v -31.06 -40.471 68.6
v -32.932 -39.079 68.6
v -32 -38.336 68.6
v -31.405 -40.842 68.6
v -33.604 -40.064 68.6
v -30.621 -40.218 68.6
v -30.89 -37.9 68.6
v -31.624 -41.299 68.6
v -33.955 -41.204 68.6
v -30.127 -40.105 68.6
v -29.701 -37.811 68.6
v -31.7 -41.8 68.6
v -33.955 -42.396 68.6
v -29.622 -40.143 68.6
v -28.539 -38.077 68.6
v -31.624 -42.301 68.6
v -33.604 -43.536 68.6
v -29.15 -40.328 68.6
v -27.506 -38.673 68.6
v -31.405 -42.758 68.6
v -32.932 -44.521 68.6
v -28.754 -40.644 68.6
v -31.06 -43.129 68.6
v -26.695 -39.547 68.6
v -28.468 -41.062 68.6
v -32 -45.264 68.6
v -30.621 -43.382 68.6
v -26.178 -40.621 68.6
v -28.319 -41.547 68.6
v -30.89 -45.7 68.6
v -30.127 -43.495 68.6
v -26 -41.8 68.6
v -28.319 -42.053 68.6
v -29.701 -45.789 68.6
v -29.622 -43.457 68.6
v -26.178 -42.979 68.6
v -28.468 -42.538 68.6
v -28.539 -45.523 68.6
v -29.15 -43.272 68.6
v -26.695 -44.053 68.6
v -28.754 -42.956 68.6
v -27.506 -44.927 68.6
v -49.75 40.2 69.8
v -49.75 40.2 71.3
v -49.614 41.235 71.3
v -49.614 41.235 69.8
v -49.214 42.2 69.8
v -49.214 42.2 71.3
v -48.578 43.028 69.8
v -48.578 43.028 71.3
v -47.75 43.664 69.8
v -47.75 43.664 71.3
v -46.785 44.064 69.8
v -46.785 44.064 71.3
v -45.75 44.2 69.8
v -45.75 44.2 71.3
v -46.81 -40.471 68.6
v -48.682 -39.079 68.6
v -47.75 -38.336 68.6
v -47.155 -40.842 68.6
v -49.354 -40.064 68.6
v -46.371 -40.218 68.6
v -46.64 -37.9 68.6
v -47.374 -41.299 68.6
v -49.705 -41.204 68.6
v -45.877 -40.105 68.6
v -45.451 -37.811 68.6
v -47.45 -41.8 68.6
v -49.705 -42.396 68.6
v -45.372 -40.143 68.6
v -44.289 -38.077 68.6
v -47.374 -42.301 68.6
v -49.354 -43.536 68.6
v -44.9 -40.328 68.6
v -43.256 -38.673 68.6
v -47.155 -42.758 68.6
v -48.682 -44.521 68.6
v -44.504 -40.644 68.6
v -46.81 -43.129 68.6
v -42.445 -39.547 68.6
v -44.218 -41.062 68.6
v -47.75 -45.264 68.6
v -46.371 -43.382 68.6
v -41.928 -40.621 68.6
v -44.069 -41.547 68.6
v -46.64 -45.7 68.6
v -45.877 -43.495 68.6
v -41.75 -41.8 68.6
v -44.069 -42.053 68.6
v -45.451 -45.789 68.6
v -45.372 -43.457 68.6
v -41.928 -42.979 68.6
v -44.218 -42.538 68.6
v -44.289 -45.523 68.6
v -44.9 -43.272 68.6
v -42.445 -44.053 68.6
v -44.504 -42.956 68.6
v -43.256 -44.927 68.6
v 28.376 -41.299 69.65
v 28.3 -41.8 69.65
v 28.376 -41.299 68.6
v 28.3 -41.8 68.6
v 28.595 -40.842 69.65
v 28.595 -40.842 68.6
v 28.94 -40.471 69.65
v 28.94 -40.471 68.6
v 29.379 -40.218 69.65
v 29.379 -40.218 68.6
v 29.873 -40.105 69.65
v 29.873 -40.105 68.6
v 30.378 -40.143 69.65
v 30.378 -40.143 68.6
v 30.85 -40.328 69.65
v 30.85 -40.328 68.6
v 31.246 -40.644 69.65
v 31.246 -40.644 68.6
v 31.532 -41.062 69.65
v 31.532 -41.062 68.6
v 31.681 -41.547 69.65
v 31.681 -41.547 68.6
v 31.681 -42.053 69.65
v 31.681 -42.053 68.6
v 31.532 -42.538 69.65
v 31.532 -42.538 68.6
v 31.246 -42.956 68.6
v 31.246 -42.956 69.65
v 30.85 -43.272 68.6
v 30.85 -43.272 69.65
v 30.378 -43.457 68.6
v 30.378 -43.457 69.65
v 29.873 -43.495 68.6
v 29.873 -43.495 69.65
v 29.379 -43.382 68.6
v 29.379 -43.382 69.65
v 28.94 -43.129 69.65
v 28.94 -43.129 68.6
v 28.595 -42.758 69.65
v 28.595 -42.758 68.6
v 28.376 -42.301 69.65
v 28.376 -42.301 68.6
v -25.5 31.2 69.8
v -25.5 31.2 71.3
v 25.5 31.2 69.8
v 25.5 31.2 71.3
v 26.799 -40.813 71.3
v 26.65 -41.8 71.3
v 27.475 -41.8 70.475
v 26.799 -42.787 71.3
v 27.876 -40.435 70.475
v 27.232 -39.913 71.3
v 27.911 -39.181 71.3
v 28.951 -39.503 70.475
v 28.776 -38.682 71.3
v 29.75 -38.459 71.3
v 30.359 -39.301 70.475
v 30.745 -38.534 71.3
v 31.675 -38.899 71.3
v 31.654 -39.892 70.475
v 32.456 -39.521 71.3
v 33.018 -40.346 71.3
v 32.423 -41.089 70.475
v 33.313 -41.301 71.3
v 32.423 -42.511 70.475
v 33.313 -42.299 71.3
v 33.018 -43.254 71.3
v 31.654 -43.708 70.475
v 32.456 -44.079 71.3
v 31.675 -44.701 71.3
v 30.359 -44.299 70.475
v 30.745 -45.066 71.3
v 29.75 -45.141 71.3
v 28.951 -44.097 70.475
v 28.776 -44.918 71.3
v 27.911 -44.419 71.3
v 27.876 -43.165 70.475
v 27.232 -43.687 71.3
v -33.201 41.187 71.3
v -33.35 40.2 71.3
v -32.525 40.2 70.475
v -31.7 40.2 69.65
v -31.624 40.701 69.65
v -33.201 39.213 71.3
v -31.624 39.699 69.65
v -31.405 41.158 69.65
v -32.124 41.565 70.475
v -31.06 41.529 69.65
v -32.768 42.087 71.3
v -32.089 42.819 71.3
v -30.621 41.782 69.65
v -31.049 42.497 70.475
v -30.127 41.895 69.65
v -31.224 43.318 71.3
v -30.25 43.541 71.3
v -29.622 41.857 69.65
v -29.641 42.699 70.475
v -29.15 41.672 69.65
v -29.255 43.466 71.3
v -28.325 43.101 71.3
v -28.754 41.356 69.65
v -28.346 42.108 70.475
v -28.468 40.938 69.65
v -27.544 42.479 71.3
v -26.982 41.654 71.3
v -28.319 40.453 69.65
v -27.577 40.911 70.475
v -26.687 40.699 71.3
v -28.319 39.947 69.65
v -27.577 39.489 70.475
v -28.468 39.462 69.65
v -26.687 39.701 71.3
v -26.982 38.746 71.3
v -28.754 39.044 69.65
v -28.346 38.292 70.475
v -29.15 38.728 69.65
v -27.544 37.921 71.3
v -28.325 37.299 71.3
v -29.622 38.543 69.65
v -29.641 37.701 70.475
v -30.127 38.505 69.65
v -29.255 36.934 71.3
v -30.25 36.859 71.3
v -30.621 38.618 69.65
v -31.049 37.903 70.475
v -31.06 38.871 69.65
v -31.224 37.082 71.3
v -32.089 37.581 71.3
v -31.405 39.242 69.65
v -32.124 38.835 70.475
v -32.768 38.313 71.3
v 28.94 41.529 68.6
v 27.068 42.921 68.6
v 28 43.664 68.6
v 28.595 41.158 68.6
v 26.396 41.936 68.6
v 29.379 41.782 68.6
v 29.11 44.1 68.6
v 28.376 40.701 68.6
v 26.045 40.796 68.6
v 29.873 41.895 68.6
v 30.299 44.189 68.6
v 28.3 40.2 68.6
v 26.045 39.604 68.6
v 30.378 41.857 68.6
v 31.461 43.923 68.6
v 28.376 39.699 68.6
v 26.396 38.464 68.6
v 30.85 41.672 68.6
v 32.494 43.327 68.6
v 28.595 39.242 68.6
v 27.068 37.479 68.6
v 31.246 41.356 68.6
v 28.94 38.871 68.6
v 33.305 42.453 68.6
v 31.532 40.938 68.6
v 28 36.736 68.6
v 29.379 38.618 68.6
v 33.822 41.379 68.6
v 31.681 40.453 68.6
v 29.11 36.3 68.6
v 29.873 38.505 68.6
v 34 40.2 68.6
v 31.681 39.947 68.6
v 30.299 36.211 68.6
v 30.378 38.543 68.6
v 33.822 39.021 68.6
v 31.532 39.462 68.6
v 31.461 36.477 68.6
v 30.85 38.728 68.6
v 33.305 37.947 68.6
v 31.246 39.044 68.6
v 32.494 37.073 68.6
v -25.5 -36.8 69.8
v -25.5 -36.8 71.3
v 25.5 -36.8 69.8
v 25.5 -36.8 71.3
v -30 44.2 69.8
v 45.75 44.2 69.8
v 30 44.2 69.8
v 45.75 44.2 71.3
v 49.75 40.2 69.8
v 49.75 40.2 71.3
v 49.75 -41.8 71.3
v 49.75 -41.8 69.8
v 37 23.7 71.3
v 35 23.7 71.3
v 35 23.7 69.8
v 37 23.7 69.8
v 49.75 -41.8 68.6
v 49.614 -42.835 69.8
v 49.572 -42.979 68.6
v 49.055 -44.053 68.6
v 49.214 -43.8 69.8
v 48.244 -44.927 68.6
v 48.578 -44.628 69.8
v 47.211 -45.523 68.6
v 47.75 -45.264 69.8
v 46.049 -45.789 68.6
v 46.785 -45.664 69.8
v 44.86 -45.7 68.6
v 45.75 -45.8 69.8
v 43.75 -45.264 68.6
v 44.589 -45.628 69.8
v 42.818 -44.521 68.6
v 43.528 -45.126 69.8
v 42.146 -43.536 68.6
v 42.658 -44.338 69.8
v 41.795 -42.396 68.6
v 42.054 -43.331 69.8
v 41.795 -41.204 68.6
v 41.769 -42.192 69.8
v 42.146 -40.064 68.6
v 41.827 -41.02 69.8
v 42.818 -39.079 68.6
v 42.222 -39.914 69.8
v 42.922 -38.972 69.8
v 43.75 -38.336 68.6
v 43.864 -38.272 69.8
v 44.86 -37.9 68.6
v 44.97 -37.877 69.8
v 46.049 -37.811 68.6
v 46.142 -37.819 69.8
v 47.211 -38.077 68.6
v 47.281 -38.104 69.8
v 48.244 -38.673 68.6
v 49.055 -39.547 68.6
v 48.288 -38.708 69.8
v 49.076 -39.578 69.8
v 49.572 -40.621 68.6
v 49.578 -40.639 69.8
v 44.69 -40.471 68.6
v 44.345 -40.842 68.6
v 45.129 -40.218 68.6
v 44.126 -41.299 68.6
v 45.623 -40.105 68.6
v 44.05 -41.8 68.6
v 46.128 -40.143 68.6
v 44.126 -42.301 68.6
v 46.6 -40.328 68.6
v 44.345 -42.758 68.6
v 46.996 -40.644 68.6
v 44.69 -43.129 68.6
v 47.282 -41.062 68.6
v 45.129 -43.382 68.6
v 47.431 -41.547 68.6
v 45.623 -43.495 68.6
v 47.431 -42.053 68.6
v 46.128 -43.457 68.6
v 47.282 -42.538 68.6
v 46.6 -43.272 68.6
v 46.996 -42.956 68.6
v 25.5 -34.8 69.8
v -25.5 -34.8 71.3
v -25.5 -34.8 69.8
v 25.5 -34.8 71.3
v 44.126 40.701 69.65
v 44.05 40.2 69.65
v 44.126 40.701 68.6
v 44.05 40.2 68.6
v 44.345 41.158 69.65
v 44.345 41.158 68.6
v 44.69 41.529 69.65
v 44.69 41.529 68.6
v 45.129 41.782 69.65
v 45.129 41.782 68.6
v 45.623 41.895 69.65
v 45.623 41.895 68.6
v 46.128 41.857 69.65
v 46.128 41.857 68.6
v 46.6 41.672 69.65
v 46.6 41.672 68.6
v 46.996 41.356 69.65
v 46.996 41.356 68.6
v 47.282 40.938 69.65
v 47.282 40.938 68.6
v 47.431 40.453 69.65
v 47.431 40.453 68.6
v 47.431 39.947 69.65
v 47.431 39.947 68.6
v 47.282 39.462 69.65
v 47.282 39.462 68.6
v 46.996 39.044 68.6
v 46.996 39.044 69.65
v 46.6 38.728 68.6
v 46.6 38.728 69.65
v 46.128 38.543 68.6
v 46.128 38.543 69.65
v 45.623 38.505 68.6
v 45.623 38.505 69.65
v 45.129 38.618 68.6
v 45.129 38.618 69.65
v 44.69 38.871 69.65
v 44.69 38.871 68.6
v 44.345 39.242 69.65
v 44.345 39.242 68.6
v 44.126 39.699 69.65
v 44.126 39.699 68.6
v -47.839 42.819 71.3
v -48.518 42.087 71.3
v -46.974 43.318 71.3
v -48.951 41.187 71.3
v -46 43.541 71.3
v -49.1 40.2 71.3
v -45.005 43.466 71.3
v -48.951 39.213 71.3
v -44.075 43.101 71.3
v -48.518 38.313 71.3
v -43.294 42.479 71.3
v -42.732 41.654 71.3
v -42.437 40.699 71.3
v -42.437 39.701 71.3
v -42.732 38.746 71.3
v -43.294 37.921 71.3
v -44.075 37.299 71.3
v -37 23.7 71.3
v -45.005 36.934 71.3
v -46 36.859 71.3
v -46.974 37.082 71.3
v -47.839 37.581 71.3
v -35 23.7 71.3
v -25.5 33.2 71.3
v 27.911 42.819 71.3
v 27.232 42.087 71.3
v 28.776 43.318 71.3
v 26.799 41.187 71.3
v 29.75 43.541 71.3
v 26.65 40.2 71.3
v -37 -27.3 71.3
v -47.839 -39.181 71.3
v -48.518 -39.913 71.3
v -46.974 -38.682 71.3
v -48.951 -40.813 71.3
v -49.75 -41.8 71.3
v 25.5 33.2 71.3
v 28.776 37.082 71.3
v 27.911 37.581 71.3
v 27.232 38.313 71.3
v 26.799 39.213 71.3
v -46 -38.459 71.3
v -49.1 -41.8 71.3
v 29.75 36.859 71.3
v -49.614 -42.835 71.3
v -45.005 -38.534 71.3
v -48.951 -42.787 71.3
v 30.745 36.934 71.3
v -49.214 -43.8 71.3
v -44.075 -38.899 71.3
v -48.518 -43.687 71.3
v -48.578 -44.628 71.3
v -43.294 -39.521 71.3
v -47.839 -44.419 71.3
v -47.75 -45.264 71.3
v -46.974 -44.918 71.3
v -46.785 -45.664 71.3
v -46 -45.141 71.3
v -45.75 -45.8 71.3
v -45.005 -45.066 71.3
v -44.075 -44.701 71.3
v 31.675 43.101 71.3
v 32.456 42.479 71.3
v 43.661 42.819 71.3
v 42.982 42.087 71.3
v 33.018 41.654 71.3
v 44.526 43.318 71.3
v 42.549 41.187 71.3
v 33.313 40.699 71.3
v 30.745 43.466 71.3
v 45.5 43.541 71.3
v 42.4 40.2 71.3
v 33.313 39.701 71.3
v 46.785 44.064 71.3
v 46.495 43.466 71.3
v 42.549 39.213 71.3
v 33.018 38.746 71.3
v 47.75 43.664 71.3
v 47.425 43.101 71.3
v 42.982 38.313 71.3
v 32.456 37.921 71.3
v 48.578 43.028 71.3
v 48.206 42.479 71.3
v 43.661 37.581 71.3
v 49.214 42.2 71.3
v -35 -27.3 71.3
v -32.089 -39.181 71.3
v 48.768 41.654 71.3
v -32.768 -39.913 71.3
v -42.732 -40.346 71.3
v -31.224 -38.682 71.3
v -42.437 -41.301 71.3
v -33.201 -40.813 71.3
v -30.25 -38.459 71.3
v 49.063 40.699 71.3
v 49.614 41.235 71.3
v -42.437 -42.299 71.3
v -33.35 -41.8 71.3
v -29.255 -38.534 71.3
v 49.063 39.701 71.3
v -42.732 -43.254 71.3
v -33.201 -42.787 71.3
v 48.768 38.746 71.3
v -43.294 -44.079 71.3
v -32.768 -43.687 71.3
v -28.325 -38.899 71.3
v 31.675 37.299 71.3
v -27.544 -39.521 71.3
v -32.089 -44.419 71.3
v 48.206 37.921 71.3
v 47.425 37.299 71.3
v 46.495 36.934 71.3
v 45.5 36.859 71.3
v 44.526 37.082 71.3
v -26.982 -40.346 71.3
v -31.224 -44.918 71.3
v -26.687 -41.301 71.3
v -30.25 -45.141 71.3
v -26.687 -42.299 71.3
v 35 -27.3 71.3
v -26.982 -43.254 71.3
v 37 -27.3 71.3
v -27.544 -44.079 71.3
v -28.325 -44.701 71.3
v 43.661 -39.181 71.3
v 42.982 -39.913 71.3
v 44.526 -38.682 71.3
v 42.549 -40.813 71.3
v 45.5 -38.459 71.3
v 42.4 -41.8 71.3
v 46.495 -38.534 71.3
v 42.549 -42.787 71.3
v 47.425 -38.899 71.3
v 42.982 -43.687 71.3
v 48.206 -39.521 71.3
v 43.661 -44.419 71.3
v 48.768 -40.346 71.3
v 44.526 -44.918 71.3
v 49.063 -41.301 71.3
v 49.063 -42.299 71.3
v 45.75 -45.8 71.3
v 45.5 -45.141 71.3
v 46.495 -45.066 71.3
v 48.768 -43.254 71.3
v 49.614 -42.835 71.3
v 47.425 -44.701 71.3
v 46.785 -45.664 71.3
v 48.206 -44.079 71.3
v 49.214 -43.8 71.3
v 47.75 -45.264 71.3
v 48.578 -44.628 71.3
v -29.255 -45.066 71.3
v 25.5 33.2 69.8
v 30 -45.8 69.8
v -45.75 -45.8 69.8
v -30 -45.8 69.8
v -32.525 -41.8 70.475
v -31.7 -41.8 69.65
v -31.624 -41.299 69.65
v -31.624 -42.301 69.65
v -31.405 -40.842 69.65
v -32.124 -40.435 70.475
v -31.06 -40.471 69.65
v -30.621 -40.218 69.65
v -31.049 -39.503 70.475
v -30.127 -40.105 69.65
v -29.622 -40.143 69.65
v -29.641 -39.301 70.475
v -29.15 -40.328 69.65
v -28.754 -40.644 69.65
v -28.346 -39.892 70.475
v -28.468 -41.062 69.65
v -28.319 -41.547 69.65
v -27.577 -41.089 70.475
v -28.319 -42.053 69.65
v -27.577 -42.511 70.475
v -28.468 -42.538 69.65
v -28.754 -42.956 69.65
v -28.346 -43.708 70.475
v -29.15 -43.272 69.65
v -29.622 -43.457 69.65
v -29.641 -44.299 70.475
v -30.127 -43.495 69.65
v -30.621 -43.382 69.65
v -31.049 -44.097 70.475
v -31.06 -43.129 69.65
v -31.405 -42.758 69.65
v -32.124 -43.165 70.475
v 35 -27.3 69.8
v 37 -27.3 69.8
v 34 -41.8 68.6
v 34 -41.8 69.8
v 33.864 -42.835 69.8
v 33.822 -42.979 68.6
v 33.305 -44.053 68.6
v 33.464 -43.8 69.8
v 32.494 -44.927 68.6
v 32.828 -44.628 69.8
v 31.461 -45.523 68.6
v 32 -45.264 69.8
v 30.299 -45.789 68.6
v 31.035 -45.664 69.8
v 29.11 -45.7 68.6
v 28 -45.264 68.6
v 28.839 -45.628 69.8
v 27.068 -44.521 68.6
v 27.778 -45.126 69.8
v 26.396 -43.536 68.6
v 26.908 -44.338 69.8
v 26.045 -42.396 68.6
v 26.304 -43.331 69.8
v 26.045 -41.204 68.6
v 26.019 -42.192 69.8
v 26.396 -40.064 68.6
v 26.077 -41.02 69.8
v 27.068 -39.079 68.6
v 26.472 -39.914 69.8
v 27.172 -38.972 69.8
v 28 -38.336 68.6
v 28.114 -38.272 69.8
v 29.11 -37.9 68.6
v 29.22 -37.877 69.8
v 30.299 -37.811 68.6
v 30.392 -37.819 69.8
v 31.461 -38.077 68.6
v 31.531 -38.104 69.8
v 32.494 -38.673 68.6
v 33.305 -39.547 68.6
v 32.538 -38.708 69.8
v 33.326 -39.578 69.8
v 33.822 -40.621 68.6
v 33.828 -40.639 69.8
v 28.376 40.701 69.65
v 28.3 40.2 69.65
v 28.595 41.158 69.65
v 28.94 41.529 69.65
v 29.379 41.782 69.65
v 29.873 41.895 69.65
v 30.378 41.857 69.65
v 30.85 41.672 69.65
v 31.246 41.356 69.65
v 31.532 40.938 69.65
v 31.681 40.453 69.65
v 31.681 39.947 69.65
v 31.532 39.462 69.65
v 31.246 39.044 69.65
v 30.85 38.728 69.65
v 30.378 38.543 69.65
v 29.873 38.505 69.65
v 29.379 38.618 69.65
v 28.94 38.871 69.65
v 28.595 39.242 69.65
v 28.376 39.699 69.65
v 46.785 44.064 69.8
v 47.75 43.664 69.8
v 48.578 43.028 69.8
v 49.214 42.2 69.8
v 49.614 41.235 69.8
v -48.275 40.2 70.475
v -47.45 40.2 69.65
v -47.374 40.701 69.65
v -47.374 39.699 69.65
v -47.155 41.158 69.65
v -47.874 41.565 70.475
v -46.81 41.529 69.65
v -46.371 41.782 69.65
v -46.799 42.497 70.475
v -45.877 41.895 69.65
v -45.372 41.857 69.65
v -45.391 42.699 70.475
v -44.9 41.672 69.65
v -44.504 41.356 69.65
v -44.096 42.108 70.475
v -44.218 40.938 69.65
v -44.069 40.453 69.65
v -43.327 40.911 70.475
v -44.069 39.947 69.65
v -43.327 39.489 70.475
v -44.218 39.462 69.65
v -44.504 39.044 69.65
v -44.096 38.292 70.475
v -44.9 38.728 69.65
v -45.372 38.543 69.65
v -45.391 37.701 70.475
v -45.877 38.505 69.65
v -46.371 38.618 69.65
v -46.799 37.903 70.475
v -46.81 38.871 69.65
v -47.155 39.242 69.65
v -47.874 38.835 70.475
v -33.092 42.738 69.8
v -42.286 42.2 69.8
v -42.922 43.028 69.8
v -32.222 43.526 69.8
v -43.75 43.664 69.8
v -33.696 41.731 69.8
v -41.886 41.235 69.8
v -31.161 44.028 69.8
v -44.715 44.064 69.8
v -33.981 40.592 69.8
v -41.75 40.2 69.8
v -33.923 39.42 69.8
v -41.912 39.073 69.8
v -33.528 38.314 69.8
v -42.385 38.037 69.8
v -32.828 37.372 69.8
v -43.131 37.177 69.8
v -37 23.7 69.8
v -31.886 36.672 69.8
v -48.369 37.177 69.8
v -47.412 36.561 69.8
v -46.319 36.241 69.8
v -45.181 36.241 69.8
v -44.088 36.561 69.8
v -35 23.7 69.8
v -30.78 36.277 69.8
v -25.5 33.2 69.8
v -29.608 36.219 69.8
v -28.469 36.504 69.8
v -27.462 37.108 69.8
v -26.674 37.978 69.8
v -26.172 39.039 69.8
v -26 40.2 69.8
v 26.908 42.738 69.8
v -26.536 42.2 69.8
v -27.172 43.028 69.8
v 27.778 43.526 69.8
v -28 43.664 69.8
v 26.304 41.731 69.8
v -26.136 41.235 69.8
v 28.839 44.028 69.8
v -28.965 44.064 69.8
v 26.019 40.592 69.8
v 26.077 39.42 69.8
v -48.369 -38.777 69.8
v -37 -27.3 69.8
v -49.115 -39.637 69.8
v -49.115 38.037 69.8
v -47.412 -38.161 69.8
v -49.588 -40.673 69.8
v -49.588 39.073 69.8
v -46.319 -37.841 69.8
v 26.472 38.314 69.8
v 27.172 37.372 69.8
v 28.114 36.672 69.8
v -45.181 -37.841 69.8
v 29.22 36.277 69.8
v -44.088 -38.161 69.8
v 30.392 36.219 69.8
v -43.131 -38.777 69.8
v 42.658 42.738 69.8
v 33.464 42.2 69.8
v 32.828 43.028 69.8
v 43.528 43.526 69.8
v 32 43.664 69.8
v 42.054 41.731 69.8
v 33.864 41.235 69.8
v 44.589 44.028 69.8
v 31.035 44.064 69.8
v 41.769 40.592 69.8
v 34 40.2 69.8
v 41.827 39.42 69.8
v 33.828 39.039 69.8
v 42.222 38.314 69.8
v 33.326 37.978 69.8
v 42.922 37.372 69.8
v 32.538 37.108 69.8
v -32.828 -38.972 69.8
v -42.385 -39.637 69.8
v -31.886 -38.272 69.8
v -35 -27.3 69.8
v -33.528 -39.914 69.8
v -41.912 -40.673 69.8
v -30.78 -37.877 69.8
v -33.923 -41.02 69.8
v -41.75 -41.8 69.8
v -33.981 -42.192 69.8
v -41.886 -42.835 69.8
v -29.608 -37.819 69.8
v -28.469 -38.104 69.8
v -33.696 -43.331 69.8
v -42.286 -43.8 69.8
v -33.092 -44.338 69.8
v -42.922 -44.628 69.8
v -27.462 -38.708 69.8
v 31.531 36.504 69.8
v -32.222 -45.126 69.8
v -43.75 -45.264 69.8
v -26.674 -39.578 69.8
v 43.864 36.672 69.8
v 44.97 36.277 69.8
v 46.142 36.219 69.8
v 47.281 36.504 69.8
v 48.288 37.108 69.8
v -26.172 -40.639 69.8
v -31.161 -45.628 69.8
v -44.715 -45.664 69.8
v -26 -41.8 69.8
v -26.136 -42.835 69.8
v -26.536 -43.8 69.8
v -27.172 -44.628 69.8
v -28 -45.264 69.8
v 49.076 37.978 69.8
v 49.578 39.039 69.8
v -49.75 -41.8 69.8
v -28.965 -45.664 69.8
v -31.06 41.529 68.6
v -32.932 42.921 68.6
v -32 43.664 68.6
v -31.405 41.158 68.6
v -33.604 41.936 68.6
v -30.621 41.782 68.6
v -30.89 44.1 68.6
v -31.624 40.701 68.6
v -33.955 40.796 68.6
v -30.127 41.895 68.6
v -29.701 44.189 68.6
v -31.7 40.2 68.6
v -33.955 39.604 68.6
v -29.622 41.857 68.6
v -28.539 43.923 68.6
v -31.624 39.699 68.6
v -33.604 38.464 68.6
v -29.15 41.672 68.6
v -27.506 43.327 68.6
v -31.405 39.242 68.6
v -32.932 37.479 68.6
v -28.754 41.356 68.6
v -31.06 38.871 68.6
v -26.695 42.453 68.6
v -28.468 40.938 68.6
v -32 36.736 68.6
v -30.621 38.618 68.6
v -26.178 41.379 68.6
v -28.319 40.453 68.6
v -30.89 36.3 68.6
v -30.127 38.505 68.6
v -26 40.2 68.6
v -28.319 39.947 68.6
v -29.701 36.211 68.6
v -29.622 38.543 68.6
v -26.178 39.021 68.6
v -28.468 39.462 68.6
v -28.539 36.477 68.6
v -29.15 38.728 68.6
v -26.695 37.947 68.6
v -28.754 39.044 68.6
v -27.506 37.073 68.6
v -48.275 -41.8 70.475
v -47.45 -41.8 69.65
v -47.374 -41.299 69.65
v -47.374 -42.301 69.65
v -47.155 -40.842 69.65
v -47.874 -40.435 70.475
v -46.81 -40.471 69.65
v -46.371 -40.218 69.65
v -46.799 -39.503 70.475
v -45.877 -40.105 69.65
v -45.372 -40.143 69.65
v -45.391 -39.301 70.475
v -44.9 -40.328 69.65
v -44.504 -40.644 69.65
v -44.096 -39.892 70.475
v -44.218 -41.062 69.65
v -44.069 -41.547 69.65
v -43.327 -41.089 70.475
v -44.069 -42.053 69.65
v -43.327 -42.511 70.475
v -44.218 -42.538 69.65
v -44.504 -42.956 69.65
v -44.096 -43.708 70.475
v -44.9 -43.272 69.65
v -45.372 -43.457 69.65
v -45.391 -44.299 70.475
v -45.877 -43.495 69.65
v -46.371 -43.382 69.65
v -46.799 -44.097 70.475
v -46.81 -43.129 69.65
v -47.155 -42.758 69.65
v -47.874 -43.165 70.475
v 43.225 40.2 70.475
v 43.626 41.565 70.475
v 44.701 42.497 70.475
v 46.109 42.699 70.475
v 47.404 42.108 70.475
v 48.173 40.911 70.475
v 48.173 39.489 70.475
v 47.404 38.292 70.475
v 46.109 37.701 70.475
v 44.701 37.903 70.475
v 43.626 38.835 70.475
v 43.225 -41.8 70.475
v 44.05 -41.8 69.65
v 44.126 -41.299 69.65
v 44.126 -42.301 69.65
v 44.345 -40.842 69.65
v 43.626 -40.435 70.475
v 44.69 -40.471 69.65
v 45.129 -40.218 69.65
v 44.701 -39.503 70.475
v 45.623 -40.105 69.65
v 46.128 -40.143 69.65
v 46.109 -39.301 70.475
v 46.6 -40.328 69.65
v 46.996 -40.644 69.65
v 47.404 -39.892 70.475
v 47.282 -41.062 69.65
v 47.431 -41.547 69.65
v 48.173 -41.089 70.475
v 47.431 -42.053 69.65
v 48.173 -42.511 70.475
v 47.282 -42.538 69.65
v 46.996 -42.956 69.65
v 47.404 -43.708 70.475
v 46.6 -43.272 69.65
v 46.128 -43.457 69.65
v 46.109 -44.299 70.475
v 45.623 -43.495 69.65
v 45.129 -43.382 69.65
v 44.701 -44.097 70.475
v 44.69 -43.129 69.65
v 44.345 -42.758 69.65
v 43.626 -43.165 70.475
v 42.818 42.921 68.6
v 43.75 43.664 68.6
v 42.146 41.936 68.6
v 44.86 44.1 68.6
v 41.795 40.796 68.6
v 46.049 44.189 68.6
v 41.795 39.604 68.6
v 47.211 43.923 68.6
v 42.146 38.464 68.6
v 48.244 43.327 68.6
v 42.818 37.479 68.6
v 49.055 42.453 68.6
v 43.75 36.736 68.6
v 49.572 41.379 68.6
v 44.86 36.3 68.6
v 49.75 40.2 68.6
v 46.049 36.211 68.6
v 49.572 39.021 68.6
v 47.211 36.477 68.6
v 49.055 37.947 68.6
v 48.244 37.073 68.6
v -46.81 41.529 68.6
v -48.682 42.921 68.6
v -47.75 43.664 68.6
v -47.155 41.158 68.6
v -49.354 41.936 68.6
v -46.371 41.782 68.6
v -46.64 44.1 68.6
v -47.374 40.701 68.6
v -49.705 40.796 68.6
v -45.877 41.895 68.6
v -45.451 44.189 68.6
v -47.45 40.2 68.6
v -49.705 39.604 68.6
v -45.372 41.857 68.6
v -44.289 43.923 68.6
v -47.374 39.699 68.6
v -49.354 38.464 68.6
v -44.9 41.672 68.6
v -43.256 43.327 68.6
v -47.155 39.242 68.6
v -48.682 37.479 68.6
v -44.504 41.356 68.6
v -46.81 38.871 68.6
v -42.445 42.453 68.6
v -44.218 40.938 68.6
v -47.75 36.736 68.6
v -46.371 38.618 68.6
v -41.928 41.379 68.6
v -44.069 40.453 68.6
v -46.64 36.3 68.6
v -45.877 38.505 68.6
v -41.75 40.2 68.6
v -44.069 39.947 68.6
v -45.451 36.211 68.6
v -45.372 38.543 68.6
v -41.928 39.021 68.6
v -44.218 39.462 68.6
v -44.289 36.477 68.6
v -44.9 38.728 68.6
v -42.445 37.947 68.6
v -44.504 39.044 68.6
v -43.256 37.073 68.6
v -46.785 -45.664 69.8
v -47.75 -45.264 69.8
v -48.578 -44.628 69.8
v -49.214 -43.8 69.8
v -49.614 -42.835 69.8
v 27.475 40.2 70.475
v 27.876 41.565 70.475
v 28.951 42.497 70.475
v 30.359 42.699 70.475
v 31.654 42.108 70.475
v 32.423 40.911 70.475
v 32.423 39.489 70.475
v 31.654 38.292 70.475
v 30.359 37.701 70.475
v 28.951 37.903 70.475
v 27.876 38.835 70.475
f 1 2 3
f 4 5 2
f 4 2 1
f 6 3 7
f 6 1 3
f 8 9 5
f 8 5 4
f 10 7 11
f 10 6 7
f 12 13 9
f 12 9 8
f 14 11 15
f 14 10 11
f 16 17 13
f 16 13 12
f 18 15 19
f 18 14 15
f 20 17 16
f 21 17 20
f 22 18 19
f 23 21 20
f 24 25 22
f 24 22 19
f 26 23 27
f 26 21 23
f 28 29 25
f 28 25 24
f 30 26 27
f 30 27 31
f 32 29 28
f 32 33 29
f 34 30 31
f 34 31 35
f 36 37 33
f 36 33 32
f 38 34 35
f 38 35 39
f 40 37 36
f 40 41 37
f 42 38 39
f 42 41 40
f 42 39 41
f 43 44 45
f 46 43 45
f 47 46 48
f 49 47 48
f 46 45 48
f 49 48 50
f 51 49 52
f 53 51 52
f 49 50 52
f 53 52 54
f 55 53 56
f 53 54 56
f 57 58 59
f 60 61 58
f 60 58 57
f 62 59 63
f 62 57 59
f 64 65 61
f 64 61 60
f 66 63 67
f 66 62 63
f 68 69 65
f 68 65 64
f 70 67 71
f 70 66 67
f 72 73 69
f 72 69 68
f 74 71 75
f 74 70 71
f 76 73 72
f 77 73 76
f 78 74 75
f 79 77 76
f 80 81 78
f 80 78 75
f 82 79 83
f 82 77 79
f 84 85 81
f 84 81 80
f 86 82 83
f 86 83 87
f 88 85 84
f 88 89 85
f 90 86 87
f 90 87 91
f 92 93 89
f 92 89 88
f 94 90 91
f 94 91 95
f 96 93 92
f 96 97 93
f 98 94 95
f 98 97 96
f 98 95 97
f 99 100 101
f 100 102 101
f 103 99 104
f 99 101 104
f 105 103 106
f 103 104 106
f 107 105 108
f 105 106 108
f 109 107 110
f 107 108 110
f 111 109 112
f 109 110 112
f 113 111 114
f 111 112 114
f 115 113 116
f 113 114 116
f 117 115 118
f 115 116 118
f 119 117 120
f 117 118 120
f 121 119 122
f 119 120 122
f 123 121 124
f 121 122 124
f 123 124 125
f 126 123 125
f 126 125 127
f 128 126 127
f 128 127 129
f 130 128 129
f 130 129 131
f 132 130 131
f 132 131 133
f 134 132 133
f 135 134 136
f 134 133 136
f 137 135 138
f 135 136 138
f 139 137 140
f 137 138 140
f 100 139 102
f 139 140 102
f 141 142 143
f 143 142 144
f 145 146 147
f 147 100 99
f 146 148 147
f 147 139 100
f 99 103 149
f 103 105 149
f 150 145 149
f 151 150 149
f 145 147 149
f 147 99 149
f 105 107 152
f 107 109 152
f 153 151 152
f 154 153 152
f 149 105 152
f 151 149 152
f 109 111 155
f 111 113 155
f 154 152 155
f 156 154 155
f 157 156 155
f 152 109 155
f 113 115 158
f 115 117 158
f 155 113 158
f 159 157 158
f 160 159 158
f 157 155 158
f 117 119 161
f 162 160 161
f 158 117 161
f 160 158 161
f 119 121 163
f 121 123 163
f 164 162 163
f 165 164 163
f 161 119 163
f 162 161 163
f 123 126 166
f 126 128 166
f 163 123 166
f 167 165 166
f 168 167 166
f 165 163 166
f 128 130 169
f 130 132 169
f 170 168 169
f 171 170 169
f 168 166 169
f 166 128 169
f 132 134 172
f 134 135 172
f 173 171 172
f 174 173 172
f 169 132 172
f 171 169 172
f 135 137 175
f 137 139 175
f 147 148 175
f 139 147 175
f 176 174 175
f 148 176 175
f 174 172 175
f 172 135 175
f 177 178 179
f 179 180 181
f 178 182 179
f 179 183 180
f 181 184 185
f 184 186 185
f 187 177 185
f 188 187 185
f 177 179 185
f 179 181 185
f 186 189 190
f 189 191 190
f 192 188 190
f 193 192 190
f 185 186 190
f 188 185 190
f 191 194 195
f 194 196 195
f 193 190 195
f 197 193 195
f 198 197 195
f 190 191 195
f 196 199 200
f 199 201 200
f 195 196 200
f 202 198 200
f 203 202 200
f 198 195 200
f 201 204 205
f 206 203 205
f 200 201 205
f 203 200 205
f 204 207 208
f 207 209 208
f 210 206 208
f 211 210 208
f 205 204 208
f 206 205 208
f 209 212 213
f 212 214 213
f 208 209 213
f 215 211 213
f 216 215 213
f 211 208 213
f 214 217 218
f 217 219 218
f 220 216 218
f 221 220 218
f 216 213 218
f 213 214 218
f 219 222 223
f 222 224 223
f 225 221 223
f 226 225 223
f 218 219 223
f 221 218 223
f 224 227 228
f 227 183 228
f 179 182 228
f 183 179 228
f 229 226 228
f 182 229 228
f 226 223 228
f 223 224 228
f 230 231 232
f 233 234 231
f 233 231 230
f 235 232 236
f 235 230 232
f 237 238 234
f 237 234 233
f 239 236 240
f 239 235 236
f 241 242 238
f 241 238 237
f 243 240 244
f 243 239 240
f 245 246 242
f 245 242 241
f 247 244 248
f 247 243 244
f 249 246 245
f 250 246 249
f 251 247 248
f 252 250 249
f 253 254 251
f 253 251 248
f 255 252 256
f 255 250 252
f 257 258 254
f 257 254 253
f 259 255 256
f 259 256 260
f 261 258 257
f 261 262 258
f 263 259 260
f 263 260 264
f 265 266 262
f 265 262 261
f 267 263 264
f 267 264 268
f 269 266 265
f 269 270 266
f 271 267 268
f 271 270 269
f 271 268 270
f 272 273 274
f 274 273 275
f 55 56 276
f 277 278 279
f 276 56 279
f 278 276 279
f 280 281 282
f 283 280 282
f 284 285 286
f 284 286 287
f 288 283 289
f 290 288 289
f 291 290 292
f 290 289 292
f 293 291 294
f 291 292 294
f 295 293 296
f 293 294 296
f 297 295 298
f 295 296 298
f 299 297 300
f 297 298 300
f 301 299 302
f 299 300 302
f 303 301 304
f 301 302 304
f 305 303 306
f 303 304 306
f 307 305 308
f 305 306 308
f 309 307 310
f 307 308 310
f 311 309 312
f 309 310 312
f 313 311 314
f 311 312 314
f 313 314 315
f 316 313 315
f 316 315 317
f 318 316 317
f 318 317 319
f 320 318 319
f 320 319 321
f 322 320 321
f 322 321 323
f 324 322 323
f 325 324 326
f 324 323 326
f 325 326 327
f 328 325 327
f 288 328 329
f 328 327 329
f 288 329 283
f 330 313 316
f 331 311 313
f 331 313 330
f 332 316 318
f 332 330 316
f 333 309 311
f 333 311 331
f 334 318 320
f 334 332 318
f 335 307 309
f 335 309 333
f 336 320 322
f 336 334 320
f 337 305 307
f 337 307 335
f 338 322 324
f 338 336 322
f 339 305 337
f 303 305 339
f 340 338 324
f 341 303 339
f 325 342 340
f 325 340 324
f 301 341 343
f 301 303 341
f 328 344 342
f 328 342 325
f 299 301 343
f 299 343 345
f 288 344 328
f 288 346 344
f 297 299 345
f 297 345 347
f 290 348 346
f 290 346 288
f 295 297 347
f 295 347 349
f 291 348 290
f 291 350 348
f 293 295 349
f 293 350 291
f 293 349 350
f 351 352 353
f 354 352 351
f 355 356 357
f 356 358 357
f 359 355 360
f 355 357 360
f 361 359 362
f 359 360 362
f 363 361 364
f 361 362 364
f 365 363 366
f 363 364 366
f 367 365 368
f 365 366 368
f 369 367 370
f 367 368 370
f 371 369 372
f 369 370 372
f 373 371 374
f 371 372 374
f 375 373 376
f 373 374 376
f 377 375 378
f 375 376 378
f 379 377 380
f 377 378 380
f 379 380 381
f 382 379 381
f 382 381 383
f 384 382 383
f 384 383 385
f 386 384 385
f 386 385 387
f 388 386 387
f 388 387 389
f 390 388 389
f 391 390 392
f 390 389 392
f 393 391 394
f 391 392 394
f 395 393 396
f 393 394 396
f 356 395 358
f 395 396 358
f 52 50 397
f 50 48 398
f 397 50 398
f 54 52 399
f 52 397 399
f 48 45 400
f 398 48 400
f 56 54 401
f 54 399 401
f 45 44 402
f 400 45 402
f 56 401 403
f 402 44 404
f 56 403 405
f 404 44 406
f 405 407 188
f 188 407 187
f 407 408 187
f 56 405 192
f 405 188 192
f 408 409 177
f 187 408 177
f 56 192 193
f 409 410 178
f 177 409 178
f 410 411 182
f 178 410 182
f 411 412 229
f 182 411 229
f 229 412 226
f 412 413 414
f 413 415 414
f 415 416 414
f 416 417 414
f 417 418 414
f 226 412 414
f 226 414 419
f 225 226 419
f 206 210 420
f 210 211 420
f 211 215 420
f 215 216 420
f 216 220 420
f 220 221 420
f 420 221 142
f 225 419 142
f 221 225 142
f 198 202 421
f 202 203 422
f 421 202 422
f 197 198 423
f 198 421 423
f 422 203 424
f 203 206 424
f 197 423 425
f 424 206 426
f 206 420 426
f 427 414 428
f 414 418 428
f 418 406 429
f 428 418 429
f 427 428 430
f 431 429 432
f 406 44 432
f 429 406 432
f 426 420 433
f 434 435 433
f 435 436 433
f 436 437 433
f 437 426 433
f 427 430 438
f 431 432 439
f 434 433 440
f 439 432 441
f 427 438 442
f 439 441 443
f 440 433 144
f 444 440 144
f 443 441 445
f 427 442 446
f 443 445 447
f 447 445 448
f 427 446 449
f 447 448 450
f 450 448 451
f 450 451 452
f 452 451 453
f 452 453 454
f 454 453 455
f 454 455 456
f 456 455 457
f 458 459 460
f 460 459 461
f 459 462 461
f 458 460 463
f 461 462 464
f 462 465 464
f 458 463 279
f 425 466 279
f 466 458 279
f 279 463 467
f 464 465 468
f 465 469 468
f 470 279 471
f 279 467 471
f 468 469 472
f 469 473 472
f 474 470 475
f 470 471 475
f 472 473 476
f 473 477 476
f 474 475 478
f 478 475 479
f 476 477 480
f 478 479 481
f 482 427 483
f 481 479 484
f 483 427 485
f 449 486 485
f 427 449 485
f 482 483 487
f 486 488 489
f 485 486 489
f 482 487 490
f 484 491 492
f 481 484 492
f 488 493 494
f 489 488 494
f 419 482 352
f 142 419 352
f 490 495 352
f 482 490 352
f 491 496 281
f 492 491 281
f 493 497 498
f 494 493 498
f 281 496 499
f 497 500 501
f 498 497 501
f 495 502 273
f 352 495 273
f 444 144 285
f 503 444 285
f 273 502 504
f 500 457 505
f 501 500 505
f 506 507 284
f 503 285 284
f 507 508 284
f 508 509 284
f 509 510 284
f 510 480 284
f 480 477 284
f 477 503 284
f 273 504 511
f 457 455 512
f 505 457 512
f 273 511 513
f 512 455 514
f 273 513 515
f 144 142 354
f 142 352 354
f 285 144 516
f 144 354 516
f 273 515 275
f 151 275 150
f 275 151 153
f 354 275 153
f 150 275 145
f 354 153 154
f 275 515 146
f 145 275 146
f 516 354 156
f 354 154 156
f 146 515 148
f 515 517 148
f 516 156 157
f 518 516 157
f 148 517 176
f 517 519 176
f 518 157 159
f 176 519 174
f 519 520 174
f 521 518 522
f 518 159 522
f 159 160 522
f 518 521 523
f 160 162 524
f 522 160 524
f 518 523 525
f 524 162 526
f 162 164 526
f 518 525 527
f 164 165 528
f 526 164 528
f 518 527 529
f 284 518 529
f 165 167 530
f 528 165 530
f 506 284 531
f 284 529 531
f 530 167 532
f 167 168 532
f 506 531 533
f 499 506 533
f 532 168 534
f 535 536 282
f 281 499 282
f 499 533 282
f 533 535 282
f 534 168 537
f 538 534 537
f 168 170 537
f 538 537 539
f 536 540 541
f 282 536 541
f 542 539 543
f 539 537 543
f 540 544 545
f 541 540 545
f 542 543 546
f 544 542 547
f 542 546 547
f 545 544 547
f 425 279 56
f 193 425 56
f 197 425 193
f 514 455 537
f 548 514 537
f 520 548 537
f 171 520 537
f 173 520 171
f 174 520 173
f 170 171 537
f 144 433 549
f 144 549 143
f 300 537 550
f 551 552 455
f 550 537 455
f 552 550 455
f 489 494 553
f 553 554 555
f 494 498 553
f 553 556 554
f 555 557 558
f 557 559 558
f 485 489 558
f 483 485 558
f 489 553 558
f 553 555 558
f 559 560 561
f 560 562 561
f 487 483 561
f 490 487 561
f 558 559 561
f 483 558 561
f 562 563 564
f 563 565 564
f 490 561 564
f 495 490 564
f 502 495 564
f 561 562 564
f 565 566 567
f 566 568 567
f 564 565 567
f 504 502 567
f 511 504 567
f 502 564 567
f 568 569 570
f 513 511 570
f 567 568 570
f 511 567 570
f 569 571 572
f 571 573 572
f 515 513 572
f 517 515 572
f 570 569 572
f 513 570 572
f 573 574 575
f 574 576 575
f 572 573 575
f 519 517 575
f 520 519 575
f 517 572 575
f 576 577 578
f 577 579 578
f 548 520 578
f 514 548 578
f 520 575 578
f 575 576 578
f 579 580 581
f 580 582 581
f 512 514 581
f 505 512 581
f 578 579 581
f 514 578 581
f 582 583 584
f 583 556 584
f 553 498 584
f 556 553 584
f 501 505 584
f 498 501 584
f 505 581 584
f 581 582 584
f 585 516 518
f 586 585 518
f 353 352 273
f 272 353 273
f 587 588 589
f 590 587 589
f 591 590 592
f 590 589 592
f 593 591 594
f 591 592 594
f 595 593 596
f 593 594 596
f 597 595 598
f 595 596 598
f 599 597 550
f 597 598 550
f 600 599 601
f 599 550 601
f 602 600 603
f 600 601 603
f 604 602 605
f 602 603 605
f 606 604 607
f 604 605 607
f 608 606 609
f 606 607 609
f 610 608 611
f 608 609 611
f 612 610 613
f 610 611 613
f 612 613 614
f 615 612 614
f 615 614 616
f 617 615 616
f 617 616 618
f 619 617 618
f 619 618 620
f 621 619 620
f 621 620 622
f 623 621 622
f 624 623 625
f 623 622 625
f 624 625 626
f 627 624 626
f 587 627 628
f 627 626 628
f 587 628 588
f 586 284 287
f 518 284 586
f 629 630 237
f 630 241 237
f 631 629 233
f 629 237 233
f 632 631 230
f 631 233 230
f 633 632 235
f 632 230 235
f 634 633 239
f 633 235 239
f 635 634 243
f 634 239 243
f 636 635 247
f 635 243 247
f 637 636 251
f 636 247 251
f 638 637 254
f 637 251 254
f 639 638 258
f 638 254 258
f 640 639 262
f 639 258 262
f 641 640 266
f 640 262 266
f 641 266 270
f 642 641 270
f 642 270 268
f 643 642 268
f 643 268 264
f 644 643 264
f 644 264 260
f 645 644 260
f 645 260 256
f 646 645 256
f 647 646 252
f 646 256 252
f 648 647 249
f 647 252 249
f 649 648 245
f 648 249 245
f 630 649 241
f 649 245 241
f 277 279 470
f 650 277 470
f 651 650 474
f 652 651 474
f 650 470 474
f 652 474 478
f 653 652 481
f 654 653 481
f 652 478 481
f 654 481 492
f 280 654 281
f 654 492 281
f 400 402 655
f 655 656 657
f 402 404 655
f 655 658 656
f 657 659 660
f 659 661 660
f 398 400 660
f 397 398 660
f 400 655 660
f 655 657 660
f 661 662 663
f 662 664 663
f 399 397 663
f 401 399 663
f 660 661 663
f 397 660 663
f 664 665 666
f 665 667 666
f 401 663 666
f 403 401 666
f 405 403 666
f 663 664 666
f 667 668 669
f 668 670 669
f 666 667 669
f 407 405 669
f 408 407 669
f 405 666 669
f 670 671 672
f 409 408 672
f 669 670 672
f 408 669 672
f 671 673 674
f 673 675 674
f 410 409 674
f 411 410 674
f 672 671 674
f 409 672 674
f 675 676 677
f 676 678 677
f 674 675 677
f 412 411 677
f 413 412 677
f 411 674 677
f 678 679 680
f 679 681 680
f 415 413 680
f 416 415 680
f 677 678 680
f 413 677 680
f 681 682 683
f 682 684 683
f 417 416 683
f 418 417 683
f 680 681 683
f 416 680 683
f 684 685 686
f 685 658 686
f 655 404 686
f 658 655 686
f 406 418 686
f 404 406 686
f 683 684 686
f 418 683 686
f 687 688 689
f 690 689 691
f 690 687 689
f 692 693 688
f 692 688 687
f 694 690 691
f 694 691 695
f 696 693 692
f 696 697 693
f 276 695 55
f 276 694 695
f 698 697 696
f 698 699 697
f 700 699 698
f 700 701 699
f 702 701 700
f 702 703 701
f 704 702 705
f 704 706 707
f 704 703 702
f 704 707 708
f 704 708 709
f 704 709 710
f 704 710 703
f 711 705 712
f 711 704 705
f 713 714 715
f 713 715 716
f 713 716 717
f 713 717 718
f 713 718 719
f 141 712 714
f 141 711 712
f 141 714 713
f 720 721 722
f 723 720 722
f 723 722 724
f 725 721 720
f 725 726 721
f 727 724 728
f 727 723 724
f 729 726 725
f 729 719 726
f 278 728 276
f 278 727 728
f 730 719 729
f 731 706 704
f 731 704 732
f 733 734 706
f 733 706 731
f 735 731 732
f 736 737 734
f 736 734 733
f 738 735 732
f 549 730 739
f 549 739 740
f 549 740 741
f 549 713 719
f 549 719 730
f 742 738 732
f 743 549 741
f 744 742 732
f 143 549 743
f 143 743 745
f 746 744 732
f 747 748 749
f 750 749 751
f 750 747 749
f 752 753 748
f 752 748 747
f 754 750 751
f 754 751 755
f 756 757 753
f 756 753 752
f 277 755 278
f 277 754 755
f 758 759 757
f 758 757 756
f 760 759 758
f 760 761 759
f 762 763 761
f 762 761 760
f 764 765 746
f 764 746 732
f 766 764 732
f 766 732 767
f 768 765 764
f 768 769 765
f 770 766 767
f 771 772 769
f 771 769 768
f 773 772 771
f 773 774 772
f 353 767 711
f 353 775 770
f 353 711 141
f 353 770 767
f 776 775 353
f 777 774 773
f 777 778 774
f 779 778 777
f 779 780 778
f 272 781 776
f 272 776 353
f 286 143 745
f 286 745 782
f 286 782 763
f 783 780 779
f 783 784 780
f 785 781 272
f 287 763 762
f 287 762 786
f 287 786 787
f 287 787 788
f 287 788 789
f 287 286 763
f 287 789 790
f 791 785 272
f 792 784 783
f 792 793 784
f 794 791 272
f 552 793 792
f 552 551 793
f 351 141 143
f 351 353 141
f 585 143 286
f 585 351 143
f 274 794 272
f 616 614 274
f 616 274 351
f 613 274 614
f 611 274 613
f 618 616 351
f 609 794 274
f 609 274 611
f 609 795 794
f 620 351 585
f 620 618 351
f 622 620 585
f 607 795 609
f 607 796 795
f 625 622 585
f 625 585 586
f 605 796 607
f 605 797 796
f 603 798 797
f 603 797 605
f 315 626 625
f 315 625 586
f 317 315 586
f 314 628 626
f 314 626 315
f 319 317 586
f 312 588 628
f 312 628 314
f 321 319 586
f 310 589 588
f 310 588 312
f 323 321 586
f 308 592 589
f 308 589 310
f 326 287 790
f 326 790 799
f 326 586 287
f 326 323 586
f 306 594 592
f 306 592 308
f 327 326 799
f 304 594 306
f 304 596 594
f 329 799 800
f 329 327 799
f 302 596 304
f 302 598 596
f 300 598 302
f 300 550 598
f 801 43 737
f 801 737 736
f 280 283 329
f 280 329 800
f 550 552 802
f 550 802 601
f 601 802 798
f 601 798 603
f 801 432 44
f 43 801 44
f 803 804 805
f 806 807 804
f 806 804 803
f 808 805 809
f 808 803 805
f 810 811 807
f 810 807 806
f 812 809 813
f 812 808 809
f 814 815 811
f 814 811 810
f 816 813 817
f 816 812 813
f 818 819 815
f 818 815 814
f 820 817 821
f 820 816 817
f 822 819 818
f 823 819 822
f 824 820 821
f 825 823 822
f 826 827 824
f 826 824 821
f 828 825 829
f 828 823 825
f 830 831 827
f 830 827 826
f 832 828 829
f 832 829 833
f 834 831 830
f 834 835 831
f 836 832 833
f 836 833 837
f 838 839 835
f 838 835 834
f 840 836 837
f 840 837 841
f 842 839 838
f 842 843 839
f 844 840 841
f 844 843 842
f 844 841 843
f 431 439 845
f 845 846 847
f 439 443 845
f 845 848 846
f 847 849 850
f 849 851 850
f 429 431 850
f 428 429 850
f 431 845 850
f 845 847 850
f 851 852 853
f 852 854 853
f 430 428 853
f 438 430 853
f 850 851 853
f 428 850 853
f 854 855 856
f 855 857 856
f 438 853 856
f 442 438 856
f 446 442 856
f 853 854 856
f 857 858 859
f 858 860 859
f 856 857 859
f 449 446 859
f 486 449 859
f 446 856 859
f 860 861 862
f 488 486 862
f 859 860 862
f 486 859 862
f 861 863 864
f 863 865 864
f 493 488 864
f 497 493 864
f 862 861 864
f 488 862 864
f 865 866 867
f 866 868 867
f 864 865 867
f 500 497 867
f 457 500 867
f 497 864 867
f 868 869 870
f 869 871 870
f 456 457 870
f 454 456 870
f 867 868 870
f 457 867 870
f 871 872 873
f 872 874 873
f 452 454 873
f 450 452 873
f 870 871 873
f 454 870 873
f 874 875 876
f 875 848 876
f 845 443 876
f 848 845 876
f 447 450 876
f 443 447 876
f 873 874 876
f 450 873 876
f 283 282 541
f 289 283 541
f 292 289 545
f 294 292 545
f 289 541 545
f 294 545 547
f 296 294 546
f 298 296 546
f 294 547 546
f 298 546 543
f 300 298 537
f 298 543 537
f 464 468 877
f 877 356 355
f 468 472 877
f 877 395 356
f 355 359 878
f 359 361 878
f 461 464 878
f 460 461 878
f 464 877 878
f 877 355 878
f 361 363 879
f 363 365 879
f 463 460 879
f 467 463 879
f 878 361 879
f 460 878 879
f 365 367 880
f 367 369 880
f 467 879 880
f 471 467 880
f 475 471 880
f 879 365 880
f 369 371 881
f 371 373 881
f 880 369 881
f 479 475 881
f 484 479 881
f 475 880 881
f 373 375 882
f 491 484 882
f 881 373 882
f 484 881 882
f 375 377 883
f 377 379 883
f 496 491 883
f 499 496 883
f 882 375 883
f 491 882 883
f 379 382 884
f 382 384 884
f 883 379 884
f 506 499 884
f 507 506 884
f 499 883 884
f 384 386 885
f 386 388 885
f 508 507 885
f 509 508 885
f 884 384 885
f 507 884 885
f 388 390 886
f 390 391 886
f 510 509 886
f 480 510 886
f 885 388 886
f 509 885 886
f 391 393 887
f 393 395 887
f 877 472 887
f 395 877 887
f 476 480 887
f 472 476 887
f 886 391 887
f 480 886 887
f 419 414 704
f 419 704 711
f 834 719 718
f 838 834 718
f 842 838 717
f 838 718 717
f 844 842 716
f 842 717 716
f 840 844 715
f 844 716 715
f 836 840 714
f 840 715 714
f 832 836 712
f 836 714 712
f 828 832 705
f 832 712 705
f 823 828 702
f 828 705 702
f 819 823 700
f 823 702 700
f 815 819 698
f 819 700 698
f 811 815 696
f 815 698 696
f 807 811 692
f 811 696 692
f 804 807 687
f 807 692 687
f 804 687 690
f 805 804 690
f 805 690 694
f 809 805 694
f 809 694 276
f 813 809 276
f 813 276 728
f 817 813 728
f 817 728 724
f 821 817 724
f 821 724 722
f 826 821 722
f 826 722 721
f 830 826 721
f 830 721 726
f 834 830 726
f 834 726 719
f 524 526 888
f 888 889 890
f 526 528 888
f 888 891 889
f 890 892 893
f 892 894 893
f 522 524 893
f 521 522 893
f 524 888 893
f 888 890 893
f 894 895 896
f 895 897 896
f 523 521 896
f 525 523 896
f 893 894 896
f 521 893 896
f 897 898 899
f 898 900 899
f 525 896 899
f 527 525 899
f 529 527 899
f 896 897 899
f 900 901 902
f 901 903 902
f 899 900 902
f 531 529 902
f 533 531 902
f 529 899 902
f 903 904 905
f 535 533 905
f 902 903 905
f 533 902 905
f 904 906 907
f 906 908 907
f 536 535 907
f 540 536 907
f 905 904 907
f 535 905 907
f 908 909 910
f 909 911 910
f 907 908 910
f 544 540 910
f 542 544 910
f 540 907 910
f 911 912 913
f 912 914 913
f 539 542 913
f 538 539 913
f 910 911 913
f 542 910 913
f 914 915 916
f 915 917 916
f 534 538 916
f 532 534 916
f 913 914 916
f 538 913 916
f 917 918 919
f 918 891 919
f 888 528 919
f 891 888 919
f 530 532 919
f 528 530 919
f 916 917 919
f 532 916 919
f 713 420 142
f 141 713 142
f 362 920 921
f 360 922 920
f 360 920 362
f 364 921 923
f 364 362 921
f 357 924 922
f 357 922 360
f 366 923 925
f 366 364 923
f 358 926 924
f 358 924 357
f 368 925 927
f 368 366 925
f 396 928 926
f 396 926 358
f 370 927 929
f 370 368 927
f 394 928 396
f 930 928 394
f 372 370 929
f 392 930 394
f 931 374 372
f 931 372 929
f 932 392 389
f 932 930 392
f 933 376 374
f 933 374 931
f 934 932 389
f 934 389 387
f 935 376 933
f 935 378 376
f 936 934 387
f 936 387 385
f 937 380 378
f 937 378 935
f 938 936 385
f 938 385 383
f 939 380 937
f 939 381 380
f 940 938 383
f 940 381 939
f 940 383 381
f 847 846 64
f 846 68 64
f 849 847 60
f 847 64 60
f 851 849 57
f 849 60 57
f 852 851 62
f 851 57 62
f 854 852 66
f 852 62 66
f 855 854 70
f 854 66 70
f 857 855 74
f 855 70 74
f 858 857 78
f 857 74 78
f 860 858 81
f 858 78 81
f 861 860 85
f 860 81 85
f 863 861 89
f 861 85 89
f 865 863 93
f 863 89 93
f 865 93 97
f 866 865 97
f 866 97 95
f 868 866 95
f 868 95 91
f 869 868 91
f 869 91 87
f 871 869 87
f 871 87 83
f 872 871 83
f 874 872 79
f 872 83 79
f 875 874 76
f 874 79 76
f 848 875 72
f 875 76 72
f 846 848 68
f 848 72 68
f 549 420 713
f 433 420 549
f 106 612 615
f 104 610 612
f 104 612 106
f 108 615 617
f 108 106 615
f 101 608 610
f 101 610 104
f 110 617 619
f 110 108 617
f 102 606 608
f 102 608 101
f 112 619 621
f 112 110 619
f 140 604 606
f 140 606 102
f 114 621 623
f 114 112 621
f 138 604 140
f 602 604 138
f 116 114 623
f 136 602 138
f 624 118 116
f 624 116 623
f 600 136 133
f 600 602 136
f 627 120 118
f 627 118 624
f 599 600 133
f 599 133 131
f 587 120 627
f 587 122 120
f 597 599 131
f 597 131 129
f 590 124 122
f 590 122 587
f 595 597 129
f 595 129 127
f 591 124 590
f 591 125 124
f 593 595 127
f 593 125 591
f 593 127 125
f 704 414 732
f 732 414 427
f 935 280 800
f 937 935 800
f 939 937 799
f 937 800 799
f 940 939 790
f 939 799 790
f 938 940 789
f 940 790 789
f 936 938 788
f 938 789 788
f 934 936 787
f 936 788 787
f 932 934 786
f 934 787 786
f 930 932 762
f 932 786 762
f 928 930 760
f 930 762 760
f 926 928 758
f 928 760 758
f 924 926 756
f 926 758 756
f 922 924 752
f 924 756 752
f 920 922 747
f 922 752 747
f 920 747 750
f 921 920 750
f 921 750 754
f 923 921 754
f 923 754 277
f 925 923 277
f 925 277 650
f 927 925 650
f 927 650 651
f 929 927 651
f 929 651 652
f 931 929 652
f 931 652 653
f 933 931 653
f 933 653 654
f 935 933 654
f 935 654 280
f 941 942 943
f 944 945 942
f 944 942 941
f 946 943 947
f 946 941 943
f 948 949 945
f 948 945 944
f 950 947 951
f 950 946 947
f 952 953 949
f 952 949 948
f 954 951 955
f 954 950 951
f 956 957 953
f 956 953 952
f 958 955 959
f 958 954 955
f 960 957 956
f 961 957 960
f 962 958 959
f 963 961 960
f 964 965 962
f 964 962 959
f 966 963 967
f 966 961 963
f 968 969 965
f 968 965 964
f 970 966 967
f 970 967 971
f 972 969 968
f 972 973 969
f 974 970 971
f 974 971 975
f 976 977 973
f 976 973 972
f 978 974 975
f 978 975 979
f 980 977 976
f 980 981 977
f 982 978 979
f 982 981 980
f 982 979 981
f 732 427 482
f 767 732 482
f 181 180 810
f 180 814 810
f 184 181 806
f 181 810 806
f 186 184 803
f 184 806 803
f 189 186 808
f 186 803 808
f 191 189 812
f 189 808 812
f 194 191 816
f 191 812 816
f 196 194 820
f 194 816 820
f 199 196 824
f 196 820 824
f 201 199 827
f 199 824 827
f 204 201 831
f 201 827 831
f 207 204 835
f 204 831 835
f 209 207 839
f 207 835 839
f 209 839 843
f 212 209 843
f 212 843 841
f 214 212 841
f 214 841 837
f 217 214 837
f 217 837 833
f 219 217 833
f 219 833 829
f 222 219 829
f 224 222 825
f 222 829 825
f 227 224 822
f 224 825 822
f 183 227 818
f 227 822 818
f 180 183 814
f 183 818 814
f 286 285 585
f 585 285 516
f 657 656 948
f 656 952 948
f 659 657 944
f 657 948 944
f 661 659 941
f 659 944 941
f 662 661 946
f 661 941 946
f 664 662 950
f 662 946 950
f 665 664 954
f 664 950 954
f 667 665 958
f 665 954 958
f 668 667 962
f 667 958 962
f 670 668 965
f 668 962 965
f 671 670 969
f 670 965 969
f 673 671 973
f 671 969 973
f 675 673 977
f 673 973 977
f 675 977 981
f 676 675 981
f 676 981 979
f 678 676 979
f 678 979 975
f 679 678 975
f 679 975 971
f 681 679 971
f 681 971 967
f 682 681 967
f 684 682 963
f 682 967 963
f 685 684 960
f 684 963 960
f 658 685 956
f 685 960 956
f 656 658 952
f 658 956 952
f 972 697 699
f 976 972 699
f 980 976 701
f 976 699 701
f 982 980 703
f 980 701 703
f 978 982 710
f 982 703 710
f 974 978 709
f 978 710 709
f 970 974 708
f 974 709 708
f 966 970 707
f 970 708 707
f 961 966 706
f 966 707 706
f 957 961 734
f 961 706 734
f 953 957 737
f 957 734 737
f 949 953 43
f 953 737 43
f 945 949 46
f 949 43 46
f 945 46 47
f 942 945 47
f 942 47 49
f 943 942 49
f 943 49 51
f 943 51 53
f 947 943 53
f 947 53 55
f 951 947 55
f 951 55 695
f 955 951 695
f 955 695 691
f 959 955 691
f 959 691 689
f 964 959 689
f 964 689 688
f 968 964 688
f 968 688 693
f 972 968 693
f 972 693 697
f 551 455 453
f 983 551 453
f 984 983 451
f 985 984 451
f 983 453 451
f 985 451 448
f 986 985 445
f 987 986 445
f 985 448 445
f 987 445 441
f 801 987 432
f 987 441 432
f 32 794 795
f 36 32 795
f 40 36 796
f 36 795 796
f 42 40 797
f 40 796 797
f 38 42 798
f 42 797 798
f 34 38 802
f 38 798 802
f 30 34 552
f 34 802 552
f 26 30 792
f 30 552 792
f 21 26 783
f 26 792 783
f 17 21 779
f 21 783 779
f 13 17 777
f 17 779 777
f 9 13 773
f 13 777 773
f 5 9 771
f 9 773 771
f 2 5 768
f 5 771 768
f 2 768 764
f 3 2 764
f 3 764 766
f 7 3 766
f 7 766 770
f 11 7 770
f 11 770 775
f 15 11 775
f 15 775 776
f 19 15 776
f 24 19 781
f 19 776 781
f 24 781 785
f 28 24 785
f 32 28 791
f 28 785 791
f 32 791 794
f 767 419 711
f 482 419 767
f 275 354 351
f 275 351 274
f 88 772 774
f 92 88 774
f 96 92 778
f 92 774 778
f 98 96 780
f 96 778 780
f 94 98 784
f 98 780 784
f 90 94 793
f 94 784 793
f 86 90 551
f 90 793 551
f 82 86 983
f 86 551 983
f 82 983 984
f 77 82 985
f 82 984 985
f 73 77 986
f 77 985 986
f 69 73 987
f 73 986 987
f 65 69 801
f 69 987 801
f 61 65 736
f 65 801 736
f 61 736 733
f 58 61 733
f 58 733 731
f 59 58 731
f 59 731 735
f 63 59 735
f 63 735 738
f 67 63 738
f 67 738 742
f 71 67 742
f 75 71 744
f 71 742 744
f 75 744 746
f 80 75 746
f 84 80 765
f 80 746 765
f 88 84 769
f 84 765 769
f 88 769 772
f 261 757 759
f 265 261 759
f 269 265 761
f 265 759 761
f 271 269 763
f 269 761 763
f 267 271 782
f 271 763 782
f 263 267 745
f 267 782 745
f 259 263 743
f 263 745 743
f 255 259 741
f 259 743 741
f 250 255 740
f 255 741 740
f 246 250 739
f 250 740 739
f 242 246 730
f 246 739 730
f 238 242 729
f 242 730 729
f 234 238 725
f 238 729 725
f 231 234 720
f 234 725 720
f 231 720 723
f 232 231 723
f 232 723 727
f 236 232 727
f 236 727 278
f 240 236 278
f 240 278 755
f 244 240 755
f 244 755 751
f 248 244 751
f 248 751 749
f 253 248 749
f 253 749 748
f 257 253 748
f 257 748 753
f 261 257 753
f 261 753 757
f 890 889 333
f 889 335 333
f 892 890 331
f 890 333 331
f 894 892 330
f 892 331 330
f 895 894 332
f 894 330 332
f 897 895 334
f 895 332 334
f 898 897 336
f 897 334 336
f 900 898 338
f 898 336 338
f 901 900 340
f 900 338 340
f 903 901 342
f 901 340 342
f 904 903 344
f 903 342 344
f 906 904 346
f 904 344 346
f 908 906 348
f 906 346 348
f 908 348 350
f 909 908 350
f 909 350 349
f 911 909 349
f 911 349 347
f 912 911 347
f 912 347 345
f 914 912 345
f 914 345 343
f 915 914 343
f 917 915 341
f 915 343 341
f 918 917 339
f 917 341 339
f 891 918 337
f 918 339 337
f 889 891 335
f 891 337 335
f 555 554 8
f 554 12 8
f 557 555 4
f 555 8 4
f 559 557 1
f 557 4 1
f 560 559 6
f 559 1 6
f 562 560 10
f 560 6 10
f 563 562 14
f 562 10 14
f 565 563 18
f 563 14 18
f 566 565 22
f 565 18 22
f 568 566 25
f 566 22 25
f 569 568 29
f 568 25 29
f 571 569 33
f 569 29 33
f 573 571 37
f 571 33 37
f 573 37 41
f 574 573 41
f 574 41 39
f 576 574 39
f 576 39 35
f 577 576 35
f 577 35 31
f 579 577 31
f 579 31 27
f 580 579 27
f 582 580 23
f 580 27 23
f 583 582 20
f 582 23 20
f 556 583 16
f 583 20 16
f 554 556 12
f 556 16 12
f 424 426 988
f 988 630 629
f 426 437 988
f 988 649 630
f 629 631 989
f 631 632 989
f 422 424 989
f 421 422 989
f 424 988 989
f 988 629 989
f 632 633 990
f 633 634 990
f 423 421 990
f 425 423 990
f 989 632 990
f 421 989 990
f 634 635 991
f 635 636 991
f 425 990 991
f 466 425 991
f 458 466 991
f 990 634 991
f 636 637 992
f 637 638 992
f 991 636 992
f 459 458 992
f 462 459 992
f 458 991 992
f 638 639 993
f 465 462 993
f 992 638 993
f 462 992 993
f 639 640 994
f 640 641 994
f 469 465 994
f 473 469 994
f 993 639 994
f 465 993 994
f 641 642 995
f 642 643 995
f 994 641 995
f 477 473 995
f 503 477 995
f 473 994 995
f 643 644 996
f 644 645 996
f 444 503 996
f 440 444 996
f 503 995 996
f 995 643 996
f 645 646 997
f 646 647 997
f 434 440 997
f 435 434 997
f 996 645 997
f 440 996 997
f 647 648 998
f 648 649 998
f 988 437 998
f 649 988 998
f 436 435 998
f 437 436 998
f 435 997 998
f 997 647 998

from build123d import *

# Parameters (mm, degrees)
SKETCH043_W             = 51
SKETCH043_H             = 2
SKETCH043_W_2           = 2
SKETCH043_H_2           = 51
PAD026_DEPTH            = 1.5
SKETCH044_R             = 4
SKETCH044_R_2           = 1.6
PAD027_DEPTH            = 2.7
HOLE001_D               = 3.4
HOLE001_DEPTH           = 25
HOLE001_CSINK_D         = 6.7
HOLE001_CSINK_ANGLE     = 90
BODY011_PLACEMENT_ANGLE = 180


with BuildPart() as part:
    # Sketch043 → Pad026 (new body)
    with BuildSketch(Plane.XY):
        with BuildLine():
            Line((-49.75, 40), (-49.75, -42))
            ThreePointArc((-49.75, -42), (-48.578427, -44.828427), (-45.75, -46))
            Line((-45.75, -46), (45.75, -46))
            ThreePointArc((45.75, -46), (48.578427, -44.828427), (49.75, -42))
            Line((49.75, -42), (49.75, 40))
            ThreePointArc((49.75, 40), (48.578427, 42.828427), (45.75, 44))
            Line((45.75, 44), (-45.75, 44))
            ThreePointArc((-45.75, 44), (-48.578427, 42.828427), (-49.75, 40))
        make_face()
        with Locations((0, 34)):
            Rectangle(SKETCH043_W, SKETCH043_H, mode=Mode.SUBTRACT)
        with Locations((0, -34)):
            Rectangle(SKETCH043_W, SKETCH043_H, mode=Mode.SUBTRACT)
        with Locations((36, 0)):
            Rectangle(SKETCH043_W_2, SKETCH043_H_2, mode=Mode.SUBTRACT)
        with Locations((-36, 0)):
            Rectangle(SKETCH043_W_2, SKETCH043_H_2, mode=Mode.SUBTRACT)
    extrude(amount=PAD026_DEPTH)

    # Sketch044 → Pad027 (join)
    with BuildSketch(Plane.XY):
        with Locations((-45.75, 40)):
            Circle(SKETCH044_R)
        with Locations((-45.75, 40)):
            Circle(SKETCH044_R_2, mode=Mode.SUBTRACT)
        with Locations((-30, 40)):
            Circle(SKETCH044_R)
        with Locations((-30, 40)):
            Circle(SKETCH044_R_2, mode=Mode.SUBTRACT)
        with Locations((30, 40)):
            Circle(SKETCH044_R)
        with Locations((30, 40)):
            Circle(SKETCH044_R_2, mode=Mode.SUBTRACT)
        with Locations((30, -42)):
            Circle(SKETCH044_R)
        with Locations((30, -42)):
            Circle(SKETCH044_R_2, mode=Mode.SUBTRACT)
        with Locations((-30, -42)):
            Circle(SKETCH044_R)
        with Locations((-30, -42)):
            Circle(SKETCH044_R_2, mode=Mode.SUBTRACT)
        with Locations((-45.75, -42)):
            Circle(SKETCH044_R)
        with Locations((-45.75, -42)):
            Circle(SKETCH044_R_2, mode=Mode.SUBTRACT)
        with Locations((45.75, -42)):
            Circle(SKETCH044_R)
        with Locations((45.75, -42)):
            Circle(SKETCH044_R_2, mode=Mode.SUBTRACT)
        with Locations((45.75, 40)):
            Circle(SKETCH044_R)
        with Locations((45.75, 40)):
            Circle(SKETCH044_R_2, mode=Mode.SUBTRACT)
    extrude(amount=PAD027_DEPTH)

    # Hole001
    with Locations(Plane(origin=(0, 0, 0), x_dir=(1, 0, 0), z_dir=(0, 0, -1))):
        with Locations((-45.75, -40), (-30, -40), (30, -40), (30, 42), (-30, 42), (-45.75, 42), (-45.75, 42), (-30, 42), (30, 42), (30, -40), (-30, -40), (-45.75, -40), (45.75, 42), (45.75, 42), (45.75, -40), (45.75, -40)):
            CounterSinkHole(HOLE001_D / 2, HOLE001_CSINK_D / 2, depth=HOLE001_DEPTH, counter_sink_angle=HOLE001_CSINK_ANGLE)


with BuildPart() as part_1:
    # Body011 placement: moved
    add(part.part.moved(Location((0, -1.8, 71.3))).rotate(Axis((0, -1.8, 71.3), (1, 0, 0)), BODY011_PLACEMENT_ANGLE))


solid = part_1.part
